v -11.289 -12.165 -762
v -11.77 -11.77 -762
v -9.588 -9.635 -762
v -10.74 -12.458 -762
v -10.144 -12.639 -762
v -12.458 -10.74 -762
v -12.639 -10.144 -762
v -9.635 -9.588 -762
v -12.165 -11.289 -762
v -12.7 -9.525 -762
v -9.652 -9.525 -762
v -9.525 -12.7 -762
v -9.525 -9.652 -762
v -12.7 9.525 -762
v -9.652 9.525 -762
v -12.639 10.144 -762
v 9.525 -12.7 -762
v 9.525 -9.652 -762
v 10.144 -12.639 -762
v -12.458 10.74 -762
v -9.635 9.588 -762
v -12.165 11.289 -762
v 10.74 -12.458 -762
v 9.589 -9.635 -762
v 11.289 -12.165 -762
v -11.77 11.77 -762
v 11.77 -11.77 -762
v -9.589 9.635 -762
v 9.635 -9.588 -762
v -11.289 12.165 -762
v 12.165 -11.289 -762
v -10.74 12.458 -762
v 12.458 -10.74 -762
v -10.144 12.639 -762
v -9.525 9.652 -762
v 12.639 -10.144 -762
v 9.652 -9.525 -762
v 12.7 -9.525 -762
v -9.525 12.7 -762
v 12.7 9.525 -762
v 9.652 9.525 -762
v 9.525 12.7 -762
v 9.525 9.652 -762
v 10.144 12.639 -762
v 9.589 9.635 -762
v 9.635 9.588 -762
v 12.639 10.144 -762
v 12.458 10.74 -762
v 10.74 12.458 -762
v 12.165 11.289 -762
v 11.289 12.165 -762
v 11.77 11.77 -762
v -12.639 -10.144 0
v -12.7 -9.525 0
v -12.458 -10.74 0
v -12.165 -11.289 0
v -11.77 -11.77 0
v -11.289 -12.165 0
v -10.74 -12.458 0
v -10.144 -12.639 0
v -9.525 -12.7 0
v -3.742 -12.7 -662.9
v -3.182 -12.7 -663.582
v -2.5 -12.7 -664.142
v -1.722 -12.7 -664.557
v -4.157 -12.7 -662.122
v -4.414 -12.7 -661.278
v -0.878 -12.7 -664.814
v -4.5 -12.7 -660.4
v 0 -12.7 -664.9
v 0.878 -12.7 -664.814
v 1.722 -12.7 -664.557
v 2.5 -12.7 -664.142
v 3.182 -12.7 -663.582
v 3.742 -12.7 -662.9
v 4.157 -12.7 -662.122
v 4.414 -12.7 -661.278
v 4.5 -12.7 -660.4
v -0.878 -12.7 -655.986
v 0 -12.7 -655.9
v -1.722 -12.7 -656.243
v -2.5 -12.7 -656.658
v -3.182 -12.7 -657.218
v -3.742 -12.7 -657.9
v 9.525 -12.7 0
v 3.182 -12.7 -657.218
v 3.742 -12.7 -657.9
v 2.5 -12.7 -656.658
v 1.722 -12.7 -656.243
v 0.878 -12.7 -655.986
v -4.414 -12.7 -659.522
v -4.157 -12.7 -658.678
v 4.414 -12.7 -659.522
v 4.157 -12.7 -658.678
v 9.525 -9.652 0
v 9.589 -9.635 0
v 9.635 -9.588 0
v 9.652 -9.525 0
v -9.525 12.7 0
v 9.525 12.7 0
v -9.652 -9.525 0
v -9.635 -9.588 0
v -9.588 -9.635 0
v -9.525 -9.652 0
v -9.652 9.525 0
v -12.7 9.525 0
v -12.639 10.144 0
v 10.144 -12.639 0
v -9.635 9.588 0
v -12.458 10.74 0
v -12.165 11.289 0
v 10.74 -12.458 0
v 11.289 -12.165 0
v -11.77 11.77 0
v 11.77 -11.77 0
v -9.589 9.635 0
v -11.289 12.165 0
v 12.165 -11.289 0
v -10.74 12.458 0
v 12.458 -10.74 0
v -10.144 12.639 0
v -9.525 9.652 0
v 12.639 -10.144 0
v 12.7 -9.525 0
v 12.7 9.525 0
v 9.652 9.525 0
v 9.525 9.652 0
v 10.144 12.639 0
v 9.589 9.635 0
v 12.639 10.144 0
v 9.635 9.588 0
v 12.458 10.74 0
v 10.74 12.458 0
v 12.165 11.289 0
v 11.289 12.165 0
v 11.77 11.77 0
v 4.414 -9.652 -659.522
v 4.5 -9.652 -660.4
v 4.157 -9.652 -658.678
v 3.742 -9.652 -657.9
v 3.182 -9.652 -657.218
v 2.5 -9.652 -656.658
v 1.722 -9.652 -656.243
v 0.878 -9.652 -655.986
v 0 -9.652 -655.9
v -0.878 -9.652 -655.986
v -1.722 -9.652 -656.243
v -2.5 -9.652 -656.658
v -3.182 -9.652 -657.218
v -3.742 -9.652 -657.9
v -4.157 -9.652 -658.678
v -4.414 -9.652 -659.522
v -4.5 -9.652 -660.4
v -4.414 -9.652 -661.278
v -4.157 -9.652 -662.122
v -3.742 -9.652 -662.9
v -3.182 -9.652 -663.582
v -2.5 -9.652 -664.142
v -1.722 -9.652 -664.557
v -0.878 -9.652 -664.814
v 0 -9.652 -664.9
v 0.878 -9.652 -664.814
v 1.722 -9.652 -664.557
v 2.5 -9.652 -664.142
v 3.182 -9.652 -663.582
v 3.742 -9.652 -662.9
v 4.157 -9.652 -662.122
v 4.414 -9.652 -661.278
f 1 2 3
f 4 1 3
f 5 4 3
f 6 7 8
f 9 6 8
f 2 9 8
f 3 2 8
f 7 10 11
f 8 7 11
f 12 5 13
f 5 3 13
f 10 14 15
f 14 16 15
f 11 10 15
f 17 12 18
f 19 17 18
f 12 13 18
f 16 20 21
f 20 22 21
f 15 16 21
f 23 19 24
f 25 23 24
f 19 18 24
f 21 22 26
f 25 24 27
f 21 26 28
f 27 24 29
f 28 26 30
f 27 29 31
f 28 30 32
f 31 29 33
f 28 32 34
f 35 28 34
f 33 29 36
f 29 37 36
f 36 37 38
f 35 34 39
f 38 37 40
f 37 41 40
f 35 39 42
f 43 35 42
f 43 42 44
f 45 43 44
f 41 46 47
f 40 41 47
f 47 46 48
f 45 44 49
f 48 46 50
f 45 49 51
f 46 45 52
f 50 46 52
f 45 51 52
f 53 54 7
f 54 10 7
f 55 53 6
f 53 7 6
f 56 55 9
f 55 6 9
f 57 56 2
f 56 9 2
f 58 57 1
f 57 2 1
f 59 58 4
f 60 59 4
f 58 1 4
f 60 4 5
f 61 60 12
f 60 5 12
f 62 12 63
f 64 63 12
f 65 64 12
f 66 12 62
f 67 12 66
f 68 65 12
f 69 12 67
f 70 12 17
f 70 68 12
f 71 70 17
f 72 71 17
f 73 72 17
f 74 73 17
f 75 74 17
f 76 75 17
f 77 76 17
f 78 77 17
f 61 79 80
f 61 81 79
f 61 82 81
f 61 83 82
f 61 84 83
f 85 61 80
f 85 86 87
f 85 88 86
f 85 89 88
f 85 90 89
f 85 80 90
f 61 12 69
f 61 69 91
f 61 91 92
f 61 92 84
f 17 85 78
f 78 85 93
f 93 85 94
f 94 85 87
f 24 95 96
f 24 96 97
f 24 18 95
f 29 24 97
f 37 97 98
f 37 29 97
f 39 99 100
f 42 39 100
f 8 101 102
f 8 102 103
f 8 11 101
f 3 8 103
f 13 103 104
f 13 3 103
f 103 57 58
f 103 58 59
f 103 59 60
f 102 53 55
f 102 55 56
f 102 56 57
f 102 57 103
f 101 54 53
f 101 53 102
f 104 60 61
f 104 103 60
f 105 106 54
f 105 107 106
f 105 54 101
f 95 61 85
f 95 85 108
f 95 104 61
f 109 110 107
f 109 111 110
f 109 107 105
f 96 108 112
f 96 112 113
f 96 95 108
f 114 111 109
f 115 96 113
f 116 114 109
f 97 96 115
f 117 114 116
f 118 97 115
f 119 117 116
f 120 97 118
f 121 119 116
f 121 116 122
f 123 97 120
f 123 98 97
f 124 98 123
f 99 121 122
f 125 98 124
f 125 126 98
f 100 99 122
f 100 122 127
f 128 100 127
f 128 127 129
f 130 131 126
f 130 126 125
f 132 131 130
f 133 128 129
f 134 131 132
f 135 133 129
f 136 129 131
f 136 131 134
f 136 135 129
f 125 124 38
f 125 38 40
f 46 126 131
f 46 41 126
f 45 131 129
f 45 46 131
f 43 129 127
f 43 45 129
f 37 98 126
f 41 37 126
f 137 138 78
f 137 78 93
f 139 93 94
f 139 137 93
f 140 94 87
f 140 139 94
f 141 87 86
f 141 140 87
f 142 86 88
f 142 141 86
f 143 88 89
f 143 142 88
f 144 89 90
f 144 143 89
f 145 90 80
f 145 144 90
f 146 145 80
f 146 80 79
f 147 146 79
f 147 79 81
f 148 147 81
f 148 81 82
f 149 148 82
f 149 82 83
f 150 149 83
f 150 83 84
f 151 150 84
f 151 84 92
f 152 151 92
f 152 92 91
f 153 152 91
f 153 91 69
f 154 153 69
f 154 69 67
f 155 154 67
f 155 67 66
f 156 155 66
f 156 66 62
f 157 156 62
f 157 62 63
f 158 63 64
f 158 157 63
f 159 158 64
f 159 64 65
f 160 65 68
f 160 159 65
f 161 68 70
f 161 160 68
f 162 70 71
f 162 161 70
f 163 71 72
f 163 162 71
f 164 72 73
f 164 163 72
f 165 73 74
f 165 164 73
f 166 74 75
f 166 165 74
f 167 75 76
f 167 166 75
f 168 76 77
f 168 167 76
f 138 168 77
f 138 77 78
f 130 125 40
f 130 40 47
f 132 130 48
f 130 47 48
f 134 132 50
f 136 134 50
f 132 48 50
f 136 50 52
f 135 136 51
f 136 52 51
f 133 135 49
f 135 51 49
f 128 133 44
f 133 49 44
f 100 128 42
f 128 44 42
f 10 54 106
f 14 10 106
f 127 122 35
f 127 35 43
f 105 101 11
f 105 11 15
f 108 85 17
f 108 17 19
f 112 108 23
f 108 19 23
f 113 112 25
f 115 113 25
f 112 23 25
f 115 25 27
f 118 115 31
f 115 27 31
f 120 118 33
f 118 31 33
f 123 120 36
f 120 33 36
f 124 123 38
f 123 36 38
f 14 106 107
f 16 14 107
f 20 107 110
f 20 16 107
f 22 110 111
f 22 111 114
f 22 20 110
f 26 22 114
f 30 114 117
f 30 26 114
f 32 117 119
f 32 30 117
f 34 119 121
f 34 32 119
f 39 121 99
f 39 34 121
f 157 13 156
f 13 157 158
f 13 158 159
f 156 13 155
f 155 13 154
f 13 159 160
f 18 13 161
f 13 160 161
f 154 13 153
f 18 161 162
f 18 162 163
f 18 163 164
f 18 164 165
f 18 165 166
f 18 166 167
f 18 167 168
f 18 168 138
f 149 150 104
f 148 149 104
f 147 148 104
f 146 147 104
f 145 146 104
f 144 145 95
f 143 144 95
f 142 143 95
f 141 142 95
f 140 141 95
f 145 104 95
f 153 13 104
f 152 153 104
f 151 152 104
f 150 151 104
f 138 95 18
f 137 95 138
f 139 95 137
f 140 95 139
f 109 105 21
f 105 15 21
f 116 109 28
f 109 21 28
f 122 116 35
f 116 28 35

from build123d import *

# Parameters (mm, degrees)
F0_W     = 25.4
F0_H     = 25.4
F1_DEPTH = 762
F2_R     = 3.175
F3_T     = -3.048
F4_R     = 4.5
F5_DEPTH = 12.7


with BuildPart() as f1:
    # F0 (on Top) → F1 (new body)
    with BuildSketch(Plane.XY):
        Rectangle(F0_W, F0_H)
    extrude(amount=-F1_DEPTH)

    # F2
    f2_edges = [f1.edges().sort_by_distance(p)[0] for p in [
        (-12.7, 12.7, -381),
        (-12.7, -12.7, -381),
        (12.7, 12.7, -381),
        (12.7, -12.7, -381),
    ]]
    fillet(f2_edges, radius=F2_R)

    # F3
    f3_openings = [f1.faces().sort_by_distance(p)[0] for p in [
        (0, 0, 0),
        (0, 0, -762),
    ]]
    offset(amount=F3_T, openings=f3_openings)

    # F4 (on Front) → F5 (cut, through all)
    with BuildSketch(Plane.XZ):
        with Locations((0, -660.4)):
            Circle(F4_R)
    extrude(amount=F5_DEPTH, mode=Mode.SUBTRACT)


solid = f1.part
